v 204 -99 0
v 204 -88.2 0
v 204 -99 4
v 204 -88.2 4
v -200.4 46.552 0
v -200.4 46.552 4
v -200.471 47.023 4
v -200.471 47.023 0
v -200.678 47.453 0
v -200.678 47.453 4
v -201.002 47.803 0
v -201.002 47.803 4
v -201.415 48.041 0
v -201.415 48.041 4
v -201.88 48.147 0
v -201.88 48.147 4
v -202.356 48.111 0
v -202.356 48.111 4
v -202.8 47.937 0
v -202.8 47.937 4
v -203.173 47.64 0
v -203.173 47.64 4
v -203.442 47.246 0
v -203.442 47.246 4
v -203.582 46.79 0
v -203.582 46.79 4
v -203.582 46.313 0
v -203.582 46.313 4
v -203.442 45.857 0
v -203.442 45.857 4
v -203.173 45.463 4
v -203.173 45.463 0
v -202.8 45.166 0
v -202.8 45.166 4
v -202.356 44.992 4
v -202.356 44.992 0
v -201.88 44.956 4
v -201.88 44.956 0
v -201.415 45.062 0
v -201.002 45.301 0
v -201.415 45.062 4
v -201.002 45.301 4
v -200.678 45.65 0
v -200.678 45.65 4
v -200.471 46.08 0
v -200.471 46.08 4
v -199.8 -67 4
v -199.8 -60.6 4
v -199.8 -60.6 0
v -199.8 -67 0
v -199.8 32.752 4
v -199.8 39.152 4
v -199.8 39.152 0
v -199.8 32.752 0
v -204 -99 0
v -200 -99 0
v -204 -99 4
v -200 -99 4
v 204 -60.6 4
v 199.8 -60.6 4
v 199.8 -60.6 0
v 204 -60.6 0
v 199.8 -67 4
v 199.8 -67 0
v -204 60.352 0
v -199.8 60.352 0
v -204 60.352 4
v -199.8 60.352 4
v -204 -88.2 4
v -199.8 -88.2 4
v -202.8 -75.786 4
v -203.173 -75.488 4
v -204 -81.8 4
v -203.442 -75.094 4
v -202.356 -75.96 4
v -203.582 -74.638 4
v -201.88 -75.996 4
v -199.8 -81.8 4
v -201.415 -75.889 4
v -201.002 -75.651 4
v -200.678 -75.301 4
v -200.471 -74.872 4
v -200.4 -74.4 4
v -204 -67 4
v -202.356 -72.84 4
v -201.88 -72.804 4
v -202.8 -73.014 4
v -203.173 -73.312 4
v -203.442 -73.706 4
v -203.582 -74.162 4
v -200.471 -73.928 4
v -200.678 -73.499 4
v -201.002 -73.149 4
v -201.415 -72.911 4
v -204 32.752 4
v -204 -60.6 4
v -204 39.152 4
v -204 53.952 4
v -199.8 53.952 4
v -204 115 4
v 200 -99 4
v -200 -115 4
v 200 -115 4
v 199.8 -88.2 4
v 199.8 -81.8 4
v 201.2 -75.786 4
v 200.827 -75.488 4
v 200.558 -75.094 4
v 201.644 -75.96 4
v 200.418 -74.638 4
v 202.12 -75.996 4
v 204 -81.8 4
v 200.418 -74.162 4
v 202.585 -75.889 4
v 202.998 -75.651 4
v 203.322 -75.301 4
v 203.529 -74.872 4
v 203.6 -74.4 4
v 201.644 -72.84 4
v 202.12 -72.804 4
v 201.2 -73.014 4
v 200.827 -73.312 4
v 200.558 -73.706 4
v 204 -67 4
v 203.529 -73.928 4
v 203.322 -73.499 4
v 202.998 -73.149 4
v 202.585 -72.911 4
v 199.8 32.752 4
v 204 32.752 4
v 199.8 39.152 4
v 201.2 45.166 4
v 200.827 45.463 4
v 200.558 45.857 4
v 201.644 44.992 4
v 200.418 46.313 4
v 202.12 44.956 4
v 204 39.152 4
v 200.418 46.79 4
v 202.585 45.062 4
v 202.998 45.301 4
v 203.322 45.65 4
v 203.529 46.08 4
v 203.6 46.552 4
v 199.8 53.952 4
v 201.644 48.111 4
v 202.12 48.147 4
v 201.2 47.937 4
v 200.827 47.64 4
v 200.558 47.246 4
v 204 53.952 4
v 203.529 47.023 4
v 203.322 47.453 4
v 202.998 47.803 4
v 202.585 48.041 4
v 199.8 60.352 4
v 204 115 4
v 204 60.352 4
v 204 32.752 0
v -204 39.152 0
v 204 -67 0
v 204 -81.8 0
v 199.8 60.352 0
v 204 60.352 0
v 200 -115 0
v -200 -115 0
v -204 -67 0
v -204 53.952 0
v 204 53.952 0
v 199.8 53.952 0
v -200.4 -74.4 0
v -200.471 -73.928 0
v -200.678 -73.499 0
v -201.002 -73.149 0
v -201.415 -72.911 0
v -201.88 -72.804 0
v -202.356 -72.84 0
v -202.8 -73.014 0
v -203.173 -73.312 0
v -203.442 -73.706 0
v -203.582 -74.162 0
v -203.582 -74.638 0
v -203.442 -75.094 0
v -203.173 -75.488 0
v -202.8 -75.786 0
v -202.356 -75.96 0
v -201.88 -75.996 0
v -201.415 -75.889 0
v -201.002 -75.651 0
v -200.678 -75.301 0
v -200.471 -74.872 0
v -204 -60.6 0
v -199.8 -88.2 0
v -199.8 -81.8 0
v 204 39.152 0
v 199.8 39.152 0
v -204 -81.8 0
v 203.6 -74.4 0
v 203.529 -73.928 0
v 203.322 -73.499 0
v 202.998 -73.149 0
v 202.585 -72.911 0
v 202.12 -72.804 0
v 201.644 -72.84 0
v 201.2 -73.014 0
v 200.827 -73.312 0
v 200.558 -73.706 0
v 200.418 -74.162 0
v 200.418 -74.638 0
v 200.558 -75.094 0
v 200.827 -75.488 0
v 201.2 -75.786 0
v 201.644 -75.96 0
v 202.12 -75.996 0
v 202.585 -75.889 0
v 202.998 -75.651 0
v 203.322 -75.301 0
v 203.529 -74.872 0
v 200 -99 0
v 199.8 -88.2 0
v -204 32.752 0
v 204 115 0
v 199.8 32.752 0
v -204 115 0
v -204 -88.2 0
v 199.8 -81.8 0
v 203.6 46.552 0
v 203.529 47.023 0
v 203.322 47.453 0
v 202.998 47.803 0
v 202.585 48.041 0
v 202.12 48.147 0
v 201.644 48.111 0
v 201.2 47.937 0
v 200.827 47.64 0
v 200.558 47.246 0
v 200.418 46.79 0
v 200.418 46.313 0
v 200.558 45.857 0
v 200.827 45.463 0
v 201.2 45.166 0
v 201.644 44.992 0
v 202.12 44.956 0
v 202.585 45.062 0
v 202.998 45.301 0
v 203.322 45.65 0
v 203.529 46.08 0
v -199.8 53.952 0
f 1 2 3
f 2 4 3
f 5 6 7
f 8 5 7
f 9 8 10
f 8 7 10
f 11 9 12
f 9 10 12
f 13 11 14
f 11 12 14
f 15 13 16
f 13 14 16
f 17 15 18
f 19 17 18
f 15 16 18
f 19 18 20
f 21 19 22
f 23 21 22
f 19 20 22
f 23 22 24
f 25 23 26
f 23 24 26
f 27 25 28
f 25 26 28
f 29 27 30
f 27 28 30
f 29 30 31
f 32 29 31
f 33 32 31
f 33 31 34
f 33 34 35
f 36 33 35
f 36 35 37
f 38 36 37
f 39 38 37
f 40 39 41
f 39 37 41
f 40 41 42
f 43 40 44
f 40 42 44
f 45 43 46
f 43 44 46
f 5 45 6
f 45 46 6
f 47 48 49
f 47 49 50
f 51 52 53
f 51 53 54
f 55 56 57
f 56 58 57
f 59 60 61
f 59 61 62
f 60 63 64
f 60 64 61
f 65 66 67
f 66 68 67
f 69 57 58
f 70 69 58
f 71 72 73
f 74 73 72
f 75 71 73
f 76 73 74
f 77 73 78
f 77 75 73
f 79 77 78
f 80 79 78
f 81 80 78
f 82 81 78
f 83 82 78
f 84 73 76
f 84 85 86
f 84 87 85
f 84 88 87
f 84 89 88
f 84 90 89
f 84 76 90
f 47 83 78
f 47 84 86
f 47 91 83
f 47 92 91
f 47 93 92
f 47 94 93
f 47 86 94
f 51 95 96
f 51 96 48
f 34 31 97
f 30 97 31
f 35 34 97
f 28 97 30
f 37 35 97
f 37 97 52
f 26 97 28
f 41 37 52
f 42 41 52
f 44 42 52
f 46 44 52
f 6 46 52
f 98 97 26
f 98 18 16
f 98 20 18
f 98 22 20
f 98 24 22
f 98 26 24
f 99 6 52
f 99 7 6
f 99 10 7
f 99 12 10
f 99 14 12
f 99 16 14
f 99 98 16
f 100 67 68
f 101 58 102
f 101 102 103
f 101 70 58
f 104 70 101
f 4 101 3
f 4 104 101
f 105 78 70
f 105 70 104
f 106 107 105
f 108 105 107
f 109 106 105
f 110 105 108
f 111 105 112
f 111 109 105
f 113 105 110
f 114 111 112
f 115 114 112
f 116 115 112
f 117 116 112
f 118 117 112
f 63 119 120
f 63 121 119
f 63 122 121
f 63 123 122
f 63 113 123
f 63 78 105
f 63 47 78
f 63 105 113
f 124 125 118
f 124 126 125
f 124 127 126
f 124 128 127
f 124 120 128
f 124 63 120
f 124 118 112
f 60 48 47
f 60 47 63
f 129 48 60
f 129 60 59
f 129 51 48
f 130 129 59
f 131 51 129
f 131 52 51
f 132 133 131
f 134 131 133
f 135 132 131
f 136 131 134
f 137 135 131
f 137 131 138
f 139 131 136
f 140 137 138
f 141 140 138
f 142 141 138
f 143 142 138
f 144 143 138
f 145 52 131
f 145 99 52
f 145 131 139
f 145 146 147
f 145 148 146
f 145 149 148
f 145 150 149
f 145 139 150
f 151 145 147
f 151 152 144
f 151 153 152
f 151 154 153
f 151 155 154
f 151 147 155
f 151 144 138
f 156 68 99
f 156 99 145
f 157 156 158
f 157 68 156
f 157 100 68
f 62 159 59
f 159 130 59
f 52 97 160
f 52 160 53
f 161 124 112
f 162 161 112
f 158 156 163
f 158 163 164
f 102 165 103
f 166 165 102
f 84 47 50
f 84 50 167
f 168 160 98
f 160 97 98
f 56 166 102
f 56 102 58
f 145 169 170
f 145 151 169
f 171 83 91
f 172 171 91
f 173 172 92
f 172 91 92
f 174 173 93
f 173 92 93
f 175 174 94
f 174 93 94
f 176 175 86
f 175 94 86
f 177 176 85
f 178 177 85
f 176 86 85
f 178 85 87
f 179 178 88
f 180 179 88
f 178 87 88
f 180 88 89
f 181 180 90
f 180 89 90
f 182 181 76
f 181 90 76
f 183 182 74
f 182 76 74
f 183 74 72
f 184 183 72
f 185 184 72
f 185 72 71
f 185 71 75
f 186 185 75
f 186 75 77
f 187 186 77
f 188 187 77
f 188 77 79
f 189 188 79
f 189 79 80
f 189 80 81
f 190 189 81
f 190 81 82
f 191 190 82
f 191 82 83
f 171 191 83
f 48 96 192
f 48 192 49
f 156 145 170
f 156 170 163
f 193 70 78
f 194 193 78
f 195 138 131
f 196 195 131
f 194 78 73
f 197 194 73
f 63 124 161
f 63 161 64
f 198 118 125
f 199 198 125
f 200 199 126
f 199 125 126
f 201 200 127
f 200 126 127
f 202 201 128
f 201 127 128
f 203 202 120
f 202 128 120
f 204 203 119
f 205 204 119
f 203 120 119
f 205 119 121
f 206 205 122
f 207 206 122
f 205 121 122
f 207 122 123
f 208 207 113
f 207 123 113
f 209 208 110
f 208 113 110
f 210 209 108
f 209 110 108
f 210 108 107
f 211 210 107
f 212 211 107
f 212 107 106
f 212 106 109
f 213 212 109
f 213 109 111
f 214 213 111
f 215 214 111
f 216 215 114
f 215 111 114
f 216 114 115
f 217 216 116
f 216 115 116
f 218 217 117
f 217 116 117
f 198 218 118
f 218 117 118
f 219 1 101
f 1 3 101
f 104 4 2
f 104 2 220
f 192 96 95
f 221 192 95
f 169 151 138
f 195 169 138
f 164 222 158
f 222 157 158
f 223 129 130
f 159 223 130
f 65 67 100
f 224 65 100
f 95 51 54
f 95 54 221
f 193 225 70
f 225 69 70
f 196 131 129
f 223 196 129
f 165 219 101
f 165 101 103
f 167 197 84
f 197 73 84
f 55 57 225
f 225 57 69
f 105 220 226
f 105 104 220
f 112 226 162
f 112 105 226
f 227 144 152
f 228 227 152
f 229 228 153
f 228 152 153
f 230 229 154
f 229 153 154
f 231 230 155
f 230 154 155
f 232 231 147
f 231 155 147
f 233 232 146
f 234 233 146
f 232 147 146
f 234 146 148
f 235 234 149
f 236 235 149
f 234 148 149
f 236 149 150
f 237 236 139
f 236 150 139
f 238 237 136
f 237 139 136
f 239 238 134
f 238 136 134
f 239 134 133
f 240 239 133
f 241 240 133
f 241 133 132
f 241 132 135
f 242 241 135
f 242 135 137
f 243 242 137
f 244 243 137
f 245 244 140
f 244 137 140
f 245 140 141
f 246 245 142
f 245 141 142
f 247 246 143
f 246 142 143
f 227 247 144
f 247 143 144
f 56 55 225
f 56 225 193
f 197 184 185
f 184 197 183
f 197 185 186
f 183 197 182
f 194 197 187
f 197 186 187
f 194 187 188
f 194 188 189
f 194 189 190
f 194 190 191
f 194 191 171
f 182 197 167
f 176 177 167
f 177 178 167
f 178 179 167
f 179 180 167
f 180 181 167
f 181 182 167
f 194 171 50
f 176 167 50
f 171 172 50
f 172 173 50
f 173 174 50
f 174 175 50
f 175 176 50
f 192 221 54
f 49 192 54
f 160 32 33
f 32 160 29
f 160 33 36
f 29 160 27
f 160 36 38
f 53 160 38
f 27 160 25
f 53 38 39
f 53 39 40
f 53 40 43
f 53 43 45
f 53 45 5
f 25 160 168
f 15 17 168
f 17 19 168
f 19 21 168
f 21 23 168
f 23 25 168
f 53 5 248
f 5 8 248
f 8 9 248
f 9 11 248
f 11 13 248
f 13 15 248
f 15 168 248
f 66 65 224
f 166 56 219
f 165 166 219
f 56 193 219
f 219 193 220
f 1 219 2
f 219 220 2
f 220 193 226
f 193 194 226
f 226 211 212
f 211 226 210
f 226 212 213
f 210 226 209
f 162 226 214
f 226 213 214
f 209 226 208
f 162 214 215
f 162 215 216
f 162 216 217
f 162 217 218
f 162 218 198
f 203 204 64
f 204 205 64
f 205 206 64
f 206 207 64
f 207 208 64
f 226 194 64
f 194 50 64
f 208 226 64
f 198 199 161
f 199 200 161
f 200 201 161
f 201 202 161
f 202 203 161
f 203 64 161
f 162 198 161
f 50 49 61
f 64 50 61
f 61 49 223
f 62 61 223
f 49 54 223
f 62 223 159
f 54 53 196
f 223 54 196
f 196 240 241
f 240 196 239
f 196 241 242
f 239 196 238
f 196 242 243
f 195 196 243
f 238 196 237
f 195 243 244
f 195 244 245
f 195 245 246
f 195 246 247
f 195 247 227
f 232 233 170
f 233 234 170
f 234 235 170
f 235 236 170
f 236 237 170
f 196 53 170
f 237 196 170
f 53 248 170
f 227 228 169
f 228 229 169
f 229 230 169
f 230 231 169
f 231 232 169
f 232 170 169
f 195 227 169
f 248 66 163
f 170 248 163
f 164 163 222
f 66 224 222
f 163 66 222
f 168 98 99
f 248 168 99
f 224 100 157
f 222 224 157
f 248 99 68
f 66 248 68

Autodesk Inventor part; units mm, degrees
ref_plane "YZ Plane" through (0, 0, 0) normal (1, 0, 0) x (0, 1, 0)
ref_plane "XZ Plane" through (0, 0, 0) normal (0, 1, 0) x (-1, 0, 0)
ref_plane "XY Plane" through (0, 0, 0) normal (0, 0, 1) x (1, 0, 0)
sketch "Sketch1" plane through (0, 0, 0) normal (0, 0, 1) x (1, 0, 0)
  line L0 (200, -115) -> (-200, -115)
  line L1 (-200, -115) -> (-200, 115)
  line L2 (-200, 115) -> (200, 115)
  line L3 (200, 115) -> (200, -115)
  line L4 (200, -115) -> (-200, 115) construction
  line L5 (-200, -115) -> (200, 115) construction
  point P0 (0, 0)
  dimension "d0" = 400
  dimension "d1" = 230
extrude "Extrusion1" add sketch "Sketch1" along normal blind 4
sketch "Sketch4" plane through (0, 0, 4) normal (0, 0, 1) x (1, 0, 0)
  line L0 (200, -99) -> (200, -88) projected
  line L1 (204, -99) -> (200, -99) projected
  line L2 (204, -88) -> (204, -99) projected
  line L3 (204, -88) -> (200, -88) projected
  line L4 (-204, -99) -> (-204, -88) projected
  line L5 (-200, -99) -> (-204, -99) projected
  line L6 (-200, -88) -> (-200, -99) projected
  line L7 (-200, -88) -> (-204, -88) projected
  line L8 (200, 115) -> (-200, 115) projected
  line L9 (204, -88) -> (-204, -88)
  line L10 (-204, -88) -> (-204, 115)
  line L11 (-204, 115) -> (204, 115)
  line L12 (204, 115) -> (204, -88)
  point P0 (0, 0)
extrude "Extrusion4" add sketch "Sketch4" against normal up to surface (4 mm away)
sketch "Sketch5" plane through (0, 0, 4) normal (0, 0, 1) x (1, 0, 0)
  line L0 (200, -82) -> (200, -88) construction
  line L1 (204, -88) -> (200, -88) construction
  line L2 (204, -88) -> (204, -82) construction
  line L3 (204, -82) -> (200, -82) construction
  line L4 (200, -60.8) -> (200, -66.8) construction
  line L5 (204, -66.8) -> (200, -66.8) construction
  line L6 (204, -66.8) -> (204, -60.8) construction
  line L7 (204, -60.8) -> (200, -60.8) construction
  line L8 (200, 60.1516) -> (200, 54.1516) construction
  line L9 (204, 54.1516) -> (200, 54.1516) construction
  line L10 (204, 54.1516) -> (204, 60.1516) construction
  line L11 (204, 60.1516) -> (200, 60.1516) construction
  line L12 (200, 38.9517) -> (200, 32.9516) construction
  line L13 (204, 32.9516) -> (200, 32.9516) construction
  line L14 (204, 32.9516) -> (204, 38.9517) construction
  line L15 (204, 38.9517) -> (200, 38.9517) construction
  line L16 (-204, -82) -> (-204, -88) construction
  line L17 (-200, -88) -> (-204, -88) construction
  line L18 (-200, -88) -> (-200, -82) construction
  line L19 (-200, -82) -> (-204, -82) construction
  line L20 (-204, 60.1516) -> (-204, 54.1516) construction
  line L21 (-200, 54.1516) -> (-204, 54.1516) construction
  line L22 (-200, 54.1516) -> (-200, 60.1516) construction
  line L23 (-200, 60.1516) -> (-204, 60.1516) construction
  line L24 (-204, 38.9517) -> (-204, 32.9516) construction
  line L25 (-200, 32.9516) -> (-204, 32.9516) construction
  line L26 (-200, 32.9516) -> (-200, 38.9517) construction
  line L27 (-200, 38.9517) -> (-204, 38.9517) construction
  line L28 (-204, -60.8) -> (-204, -66.8) construction
  line L29 (-200, -66.8) -> (-204, -66.8) construction
  line L30 (-200, -66.8) -> (-200, -60.8) construction
  line L31 (-200, -60.8) -> (-204, -60.8) construction
  line L32 (200, -75.9) -> (200, -72.9) construction
  line L33 (204, -75.9) -> (200, -75.9) construction
  line L34 (204, -72.9) -> (204, -75.9) construction
  line L35 (204, -72.9) -> (200, -72.9) construction
  line L36 (200, 45.0517) -> (200, 48.0516) construction
  line L37 (204, 45.0517) -> (200, 45.0517) construction
  line L38 (204, 48.0516) -> (204, 45.0517) construction
  line L39 (204, 48.0516) -> (200, 48.0516) construction
  line L40 (-204, -75.9) -> (-204, -72.9) construction
  line L41 (-200, -75.9) -> (-204, -75.9) construction
  line L42 (-200, -72.9) -> (-200, -75.9) construction
  line L43 (-200, -72.9) -> (-204, -72.9) construction
  line L44 (-204, 45.0517) -> (-204, 48.0516) construction
  line L45 (-200, 45.0517) -> (-204, 45.0517) construction
  line L46 (-200, 48.0516) -> (-200, 45.0517) construction
  line L47 (-200, 48.0516) -> (-204, 48.0516) construction
  circle A0 centre (202, -74.4) radius 1.6
  circle A1 centre (-202, -74.4) radius 1.6
  circle A2 centre (-202, 46.5516) radius 1.6
  circle A3 centre (202, 46.5516) radius 1.6
  line L48 (199.8, -88.2) -> (199.8, -81.8)
  line L49 (199.8, -81.8) -> (204.2, -81.8)
  line L50 (204.2, -81.8) -> (204.2, -88.2)
  line L51 (204.2, -88.2) -> (199.8, -88.2)
  line L52 (199.8, -67) -> (199.8, -60.6)
  line L53 (199.8, -60.6) -> (204.2, -60.6)
  line L54 (204.2, -60.6) -> (204.2, -67)
  line L55 (204.2, -67) -> (199.8, -67)
  line L56 (199.8, 39.1517) -> (199.8, 32.7516)
  line L57 (199.8, 32.7516) -> (204.2, 32.7516)
  line L58 (204.2, 32.7516) -> (204.2, 39.1517)
  line L59 (204.2, 39.1517) -> (199.8, 39.1517)
  line L60 (199.8, 53.9516) -> (199.8, 60.3516)
  line L61 (199.8, 60.3516) -> (204.2, 60.3516)
  line L62 (204.2, 60.3516) -> (204.2, 53.9516)
  line L63 (204.2, 53.9516) -> (199.8, 53.9516)
  line L64 (-204.2, -81.8) -> (-204.2, -88.2)
  line L65 (-204.2, -88.2) -> (-199.8, -88.2)
  line L66 (-199.8, -88.2) -> (-199.8, -81.8)
  line L67 (-199.8, -81.8) -> (-204.2, -81.8)
  line L68 (-204.2, -67) -> (-204.2, -60.6)
  line L69 (-204.2, -60.6) -> (-199.8, -60.6)
  line L70 (-199.8, -60.6) -> (-199.8, -67)
  line L71 (-199.8, -67) -> (-204.2, -67)
  line L72 (-204.2, 32.7516) -> (-204.2, 39.1517)
  line L73 (-204.2, 39.1517) -> (-199.8, 39.1517)
  line L74 (-199.8, 39.1517) -> (-199.8, 32.7516)
  line L75 (-199.8, 32.7516) -> (-204.2, 32.7516)
  line L76 (-204.2, 60.3516) -> (-204.2, 53.9516)
  line L77 (-204.2, 53.9516) -> (-199.8, 53.9516)
  line L78 (-199.8, 53.9516) -> (-199.8, 60.3516)
  line L79 (-199.8, 60.3516) -> (-204.2, 60.3516)
  point P0 (0, 0)
  dimension "d52" = 3.2
  dimension "d53" = 3.2
  dimension "d54" = 3.2
  dimension "d55" = 3.2
  dimension "d58" = 0.2
  dimension "d59" = 0.2
  dimension "d60" = 0.2
  dimension "d61" = 0.2
  dimension "d62" = 0.2
  dimension "d63" = 0.2
  dimension "d64" = 0.2
  dimension "d65" = 0.2
extrude "Extrusion5" cut sketch "Sketch5" against normal blind 10
properties part number "Print Platform"
